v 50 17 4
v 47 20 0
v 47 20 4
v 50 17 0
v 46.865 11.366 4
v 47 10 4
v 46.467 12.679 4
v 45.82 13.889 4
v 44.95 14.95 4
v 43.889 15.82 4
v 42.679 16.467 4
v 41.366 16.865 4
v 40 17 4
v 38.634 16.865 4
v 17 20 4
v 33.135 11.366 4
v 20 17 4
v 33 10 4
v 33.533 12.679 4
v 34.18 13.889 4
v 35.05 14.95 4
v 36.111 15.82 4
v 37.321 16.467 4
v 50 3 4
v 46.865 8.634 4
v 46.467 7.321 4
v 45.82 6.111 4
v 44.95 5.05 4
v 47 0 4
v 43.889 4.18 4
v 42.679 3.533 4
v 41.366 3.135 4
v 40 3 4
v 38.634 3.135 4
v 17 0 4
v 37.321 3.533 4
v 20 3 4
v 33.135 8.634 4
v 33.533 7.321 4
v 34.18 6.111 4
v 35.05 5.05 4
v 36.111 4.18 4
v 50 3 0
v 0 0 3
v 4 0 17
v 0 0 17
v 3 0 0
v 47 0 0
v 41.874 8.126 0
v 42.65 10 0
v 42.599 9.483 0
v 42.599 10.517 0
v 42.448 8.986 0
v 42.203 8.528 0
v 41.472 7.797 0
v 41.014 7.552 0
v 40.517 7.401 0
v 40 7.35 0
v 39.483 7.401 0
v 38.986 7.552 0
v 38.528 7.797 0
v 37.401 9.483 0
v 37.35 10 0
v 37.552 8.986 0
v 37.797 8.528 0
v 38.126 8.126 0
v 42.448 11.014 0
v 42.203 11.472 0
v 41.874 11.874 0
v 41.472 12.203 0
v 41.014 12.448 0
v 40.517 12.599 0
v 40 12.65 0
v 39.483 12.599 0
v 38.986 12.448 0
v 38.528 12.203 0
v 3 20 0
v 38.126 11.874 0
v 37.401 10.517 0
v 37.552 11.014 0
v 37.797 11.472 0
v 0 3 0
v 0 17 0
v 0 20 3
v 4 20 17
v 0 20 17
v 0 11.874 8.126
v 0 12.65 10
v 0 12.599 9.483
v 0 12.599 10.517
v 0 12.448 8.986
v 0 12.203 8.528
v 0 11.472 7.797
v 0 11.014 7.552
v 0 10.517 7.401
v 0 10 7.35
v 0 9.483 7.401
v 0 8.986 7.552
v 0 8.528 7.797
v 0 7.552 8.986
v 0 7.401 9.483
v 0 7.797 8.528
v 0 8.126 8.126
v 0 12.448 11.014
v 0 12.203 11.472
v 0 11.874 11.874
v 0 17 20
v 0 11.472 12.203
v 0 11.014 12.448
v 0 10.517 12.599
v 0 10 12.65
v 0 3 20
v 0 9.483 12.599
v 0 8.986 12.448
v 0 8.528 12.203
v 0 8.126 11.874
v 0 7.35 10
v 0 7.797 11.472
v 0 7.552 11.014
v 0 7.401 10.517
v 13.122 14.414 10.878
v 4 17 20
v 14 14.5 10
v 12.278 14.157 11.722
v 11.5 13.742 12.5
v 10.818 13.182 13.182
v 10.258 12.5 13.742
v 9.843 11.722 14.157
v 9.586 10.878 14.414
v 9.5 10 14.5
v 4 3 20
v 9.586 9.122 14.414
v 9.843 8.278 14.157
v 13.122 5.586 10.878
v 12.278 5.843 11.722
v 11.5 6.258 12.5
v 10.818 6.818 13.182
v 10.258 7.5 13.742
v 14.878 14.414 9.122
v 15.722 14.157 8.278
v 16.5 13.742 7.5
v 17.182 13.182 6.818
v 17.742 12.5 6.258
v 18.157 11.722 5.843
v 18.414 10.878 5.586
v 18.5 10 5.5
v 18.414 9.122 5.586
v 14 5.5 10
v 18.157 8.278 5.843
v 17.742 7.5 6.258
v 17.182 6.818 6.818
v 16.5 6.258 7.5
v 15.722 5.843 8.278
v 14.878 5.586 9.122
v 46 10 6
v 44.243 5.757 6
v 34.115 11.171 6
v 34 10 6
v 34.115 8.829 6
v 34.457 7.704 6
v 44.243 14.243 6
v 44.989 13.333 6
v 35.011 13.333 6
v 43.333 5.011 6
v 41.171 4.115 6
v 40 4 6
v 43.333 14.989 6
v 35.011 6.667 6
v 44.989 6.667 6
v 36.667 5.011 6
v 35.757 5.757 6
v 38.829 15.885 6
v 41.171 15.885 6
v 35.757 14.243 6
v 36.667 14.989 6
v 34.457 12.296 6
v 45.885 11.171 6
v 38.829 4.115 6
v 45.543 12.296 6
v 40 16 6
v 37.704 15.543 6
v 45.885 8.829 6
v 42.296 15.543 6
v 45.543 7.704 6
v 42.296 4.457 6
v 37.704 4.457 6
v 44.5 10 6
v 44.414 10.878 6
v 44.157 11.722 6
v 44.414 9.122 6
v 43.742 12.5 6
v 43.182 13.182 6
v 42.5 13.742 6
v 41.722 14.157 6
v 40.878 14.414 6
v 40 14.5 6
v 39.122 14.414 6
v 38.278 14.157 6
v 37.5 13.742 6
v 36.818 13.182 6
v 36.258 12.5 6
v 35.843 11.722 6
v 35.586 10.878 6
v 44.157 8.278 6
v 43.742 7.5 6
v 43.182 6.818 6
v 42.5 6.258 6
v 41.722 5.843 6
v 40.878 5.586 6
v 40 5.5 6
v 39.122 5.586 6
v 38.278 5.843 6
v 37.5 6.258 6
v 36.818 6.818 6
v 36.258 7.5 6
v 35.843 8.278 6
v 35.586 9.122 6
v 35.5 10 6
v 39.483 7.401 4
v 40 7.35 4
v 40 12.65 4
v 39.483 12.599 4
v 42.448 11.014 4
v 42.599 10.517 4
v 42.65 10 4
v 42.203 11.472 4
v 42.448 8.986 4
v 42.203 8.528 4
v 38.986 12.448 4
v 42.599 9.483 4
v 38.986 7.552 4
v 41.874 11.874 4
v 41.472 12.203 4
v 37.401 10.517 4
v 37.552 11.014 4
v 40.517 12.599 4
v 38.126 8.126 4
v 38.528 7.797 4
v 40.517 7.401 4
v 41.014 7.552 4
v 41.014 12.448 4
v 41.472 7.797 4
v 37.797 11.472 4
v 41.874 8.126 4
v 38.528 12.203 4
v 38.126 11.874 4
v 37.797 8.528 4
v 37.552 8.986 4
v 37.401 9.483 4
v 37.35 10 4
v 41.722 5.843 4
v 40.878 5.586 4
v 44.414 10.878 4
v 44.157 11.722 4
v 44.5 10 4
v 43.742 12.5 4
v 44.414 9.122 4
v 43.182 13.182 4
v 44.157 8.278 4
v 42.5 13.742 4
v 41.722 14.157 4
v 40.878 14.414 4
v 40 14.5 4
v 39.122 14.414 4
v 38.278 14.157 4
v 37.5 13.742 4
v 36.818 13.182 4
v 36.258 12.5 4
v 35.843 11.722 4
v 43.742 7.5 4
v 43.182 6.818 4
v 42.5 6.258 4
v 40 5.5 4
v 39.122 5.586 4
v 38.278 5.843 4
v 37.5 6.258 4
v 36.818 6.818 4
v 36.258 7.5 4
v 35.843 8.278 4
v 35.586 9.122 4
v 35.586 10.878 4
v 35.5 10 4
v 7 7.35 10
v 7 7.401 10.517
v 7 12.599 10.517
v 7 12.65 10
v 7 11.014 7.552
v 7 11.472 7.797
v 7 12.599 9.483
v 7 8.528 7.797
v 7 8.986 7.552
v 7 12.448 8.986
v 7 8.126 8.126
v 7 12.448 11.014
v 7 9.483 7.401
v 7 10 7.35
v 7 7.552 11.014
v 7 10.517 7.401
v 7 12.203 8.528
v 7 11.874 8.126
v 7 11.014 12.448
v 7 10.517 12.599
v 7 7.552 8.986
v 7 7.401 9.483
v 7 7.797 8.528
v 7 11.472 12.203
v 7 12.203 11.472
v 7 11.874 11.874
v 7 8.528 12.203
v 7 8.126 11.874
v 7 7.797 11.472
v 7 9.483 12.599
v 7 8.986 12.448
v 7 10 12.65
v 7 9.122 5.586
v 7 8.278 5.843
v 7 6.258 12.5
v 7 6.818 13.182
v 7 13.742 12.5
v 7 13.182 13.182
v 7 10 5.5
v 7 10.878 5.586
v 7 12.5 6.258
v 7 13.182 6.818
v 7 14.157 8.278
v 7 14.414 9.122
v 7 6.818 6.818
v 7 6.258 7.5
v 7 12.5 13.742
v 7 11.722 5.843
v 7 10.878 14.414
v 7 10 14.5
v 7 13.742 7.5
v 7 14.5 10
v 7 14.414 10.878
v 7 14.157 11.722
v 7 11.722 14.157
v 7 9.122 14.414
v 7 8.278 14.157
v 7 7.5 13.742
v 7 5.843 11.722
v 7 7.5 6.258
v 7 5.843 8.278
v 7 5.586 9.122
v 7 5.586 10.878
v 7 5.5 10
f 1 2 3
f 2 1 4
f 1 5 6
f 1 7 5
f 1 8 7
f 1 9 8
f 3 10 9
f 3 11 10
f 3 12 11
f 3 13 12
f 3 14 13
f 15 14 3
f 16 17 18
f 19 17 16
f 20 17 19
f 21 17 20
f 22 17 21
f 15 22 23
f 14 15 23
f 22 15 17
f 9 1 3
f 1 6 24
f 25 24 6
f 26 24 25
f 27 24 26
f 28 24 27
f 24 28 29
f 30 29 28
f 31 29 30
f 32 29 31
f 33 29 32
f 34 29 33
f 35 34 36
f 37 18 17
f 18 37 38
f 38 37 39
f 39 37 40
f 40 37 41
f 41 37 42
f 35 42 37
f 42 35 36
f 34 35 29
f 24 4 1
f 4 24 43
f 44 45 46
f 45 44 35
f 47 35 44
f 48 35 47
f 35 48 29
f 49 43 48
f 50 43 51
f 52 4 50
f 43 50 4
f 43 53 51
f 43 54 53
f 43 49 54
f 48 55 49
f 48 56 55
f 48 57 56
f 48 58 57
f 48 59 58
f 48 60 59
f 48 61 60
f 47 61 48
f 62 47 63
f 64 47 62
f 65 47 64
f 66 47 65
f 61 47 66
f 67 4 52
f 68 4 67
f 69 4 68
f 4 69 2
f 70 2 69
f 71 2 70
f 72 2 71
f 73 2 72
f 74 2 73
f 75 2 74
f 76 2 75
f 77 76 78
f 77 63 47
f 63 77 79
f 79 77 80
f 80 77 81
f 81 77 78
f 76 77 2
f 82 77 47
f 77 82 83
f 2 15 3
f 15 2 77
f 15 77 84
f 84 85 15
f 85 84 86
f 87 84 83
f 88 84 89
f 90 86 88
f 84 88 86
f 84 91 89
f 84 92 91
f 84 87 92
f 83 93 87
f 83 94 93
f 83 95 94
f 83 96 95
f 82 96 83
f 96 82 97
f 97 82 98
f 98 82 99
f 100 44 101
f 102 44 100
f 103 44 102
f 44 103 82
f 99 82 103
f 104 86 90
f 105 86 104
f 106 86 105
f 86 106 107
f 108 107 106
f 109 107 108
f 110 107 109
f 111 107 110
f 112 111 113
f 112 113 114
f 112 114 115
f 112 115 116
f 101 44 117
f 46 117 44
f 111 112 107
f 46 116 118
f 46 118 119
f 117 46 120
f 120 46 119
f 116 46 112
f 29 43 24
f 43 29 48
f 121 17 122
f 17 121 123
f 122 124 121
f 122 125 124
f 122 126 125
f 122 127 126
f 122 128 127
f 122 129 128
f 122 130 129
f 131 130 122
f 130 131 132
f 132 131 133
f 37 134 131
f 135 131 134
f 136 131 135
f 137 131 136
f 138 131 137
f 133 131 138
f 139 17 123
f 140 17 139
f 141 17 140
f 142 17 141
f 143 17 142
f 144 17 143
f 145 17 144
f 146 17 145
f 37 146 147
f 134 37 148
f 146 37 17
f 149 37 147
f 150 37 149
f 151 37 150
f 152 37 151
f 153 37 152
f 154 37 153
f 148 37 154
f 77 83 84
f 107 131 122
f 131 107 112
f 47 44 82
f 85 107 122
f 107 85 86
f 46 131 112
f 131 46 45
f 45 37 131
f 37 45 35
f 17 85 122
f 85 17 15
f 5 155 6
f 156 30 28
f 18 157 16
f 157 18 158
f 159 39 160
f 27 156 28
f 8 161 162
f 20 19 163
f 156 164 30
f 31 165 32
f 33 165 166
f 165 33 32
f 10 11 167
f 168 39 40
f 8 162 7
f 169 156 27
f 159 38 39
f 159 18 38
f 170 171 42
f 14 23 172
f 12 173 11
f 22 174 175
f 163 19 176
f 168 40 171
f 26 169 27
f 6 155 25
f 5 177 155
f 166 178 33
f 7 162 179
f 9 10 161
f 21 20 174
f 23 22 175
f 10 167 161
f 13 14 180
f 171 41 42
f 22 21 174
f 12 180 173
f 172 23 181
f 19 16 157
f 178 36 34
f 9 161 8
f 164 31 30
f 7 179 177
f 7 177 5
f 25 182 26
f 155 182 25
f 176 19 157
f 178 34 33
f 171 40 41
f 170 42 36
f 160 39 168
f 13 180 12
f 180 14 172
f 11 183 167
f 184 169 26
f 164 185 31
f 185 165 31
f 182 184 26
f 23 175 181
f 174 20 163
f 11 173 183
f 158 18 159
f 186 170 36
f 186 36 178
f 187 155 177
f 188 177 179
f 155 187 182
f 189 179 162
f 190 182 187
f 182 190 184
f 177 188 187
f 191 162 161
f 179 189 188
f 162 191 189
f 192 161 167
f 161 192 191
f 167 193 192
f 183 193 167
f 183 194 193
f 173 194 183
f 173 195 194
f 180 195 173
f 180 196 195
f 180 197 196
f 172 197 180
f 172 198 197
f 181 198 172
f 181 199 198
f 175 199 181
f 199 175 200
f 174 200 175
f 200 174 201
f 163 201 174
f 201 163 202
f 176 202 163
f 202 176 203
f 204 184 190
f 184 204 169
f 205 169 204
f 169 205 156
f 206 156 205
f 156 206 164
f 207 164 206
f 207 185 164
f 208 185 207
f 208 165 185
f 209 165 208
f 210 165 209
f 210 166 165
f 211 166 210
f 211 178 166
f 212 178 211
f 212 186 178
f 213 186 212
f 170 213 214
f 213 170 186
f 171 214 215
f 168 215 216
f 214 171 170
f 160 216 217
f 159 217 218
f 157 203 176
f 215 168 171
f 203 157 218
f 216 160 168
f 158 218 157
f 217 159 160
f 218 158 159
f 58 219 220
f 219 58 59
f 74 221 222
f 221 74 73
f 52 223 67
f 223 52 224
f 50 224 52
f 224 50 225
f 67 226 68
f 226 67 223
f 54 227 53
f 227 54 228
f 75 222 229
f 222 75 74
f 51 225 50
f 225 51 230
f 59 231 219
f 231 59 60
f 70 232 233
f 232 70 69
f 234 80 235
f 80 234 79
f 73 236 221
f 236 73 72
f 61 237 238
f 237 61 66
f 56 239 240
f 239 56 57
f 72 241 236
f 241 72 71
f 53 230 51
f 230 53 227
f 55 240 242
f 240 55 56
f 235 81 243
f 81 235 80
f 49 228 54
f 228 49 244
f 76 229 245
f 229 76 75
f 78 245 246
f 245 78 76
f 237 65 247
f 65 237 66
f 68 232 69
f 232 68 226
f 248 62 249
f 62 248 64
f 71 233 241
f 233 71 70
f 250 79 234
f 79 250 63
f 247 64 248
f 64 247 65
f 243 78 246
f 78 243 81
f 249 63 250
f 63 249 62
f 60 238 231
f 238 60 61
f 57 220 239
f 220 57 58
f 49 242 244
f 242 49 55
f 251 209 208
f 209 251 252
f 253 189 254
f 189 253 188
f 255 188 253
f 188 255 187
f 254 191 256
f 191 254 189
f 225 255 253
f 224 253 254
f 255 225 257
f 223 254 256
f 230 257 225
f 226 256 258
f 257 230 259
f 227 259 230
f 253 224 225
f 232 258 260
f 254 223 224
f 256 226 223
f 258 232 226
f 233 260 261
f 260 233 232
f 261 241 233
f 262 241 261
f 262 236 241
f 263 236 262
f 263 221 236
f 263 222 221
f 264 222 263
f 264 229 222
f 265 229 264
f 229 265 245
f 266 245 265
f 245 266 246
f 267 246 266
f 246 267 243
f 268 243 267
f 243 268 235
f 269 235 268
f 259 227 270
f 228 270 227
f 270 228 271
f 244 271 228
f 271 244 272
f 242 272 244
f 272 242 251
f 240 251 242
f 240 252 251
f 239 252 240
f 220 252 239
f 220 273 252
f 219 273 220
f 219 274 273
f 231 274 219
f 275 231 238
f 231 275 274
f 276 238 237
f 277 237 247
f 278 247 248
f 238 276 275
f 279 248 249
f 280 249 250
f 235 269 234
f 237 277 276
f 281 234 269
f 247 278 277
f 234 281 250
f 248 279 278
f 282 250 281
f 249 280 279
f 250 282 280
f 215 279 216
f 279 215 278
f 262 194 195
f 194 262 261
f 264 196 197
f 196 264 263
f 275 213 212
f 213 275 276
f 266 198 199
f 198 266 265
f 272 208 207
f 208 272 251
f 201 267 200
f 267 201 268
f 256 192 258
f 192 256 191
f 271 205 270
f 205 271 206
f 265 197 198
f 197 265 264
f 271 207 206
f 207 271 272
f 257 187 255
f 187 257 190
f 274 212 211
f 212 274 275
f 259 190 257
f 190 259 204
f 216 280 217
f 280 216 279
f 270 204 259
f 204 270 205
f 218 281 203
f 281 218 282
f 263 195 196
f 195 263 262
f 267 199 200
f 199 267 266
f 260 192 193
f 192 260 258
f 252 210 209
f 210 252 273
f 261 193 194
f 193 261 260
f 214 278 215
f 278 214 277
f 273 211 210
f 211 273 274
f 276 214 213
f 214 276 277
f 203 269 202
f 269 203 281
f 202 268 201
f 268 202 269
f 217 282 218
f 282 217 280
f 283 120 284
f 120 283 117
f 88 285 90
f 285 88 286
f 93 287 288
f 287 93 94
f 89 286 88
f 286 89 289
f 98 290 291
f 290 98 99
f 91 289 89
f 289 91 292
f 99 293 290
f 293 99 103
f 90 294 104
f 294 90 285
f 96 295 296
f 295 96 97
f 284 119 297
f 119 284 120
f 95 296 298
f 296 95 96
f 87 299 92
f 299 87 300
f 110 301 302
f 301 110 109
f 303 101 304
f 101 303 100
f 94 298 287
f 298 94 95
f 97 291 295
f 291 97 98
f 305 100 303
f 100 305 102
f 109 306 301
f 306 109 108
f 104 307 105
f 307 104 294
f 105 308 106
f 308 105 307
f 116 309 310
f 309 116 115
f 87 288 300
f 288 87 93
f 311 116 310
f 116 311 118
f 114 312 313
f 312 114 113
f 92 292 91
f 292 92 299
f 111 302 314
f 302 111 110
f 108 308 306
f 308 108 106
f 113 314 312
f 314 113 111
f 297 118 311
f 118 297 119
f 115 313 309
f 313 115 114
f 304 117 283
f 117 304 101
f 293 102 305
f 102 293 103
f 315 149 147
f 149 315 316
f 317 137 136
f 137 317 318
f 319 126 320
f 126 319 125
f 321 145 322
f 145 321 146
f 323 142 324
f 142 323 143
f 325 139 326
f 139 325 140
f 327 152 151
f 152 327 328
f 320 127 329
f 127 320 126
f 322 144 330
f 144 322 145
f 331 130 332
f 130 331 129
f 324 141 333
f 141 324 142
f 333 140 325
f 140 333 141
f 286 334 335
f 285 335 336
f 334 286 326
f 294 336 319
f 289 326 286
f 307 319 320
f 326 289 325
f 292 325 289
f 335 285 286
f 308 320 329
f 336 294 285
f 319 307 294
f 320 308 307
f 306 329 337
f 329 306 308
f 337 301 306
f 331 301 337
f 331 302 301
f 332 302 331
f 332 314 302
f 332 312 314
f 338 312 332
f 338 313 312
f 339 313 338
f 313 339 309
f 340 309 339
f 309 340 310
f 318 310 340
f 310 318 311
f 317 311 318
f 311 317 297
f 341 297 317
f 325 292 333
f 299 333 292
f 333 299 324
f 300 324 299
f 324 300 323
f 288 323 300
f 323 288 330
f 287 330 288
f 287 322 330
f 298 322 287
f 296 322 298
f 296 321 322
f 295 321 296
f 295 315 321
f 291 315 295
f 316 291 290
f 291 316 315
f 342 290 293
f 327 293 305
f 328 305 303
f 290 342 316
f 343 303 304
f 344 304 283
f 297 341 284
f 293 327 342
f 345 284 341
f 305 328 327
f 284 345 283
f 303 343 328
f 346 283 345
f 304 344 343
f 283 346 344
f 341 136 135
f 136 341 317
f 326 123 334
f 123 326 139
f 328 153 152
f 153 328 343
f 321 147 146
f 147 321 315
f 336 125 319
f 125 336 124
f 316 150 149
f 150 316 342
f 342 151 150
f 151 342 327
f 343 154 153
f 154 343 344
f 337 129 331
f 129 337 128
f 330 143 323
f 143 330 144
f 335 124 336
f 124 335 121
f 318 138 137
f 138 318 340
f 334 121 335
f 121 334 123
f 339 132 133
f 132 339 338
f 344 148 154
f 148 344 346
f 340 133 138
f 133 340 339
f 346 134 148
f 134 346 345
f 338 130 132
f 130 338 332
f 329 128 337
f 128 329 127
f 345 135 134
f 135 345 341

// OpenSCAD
difference() {
    union() {
        
//        translate([]) block2(50, 60, 4);
//        hull() {
//            translate([0, 0, 20]) rotate([0, 90, 0]) block2(20, 60, 4);
//            translate([0, 0,  0]) rotate([0, 0, 0]) block2(20, 60, 4);
//        }
//        hull() {
//            translate([0, 20-2.05/2,  4-1]) cube([50, 2.05, 1]);
//            translate([0, 20-2.05/2,  19]) cube([4, 2.05, 1]);
//        }
//        hull() {
//            translate([0, 40-2.05/2,  4-1]) cube([50, 2.05, 1]);
//            translate([0, 40-2.05/2,  19]) cube([4, 2.05, 1]);
//        }
        
//        translate([]) block2(50, 40, 4);
//        hull() {
//            translate([0, 0, 20]) rotate([0, 90, 0]) block2(20, 40, 4);
//            translate([0, 0,  0]) rotate([0, 0, 0]) block2(20, 40, 4);
//        }
//        hull() {
//            translate([0, 20-2.05/2,  4-1]) cube([50, 2.05, 1]);
//            translate([0, 20-2.05/2,  19]) cube([4, 2.05, 1]);
//        }
        
        translate([]) block2(50, 20, 4);
        hull() {
            translate([0, 0, 20]) rotate([0, 90, 0]) block2(20, 20, 4);
            translate([0, 0,  0]) rotate([0, 0, 0]) block2(20, 20, 4);
        }
        
        translate([40, 0+10, 4])  cylinder($fn=32, d1=14, d2=12, h=2);
//        translate([40, 20+10, 4]) cylinder($fn=32, d1=14, d2=12, h=2);
//        translate([40, 40+10, 4]) cylinder($fn=32, d1=14, d2=12, h=2);
    }
    
    // screws
    
    translate([40, 0+10, -1])   rotate([]) cylinder($fn=32, d=5.3, h=20);
    translate([40, 20+10, -1])  rotate([]) cylinder($fn=32, d=5.3, h=20);
    translate([40, 40+10, -1])  rotate([]) cylinder($fn=32, d=5.3, h=20);
    translate([40, 0+10, 4])   rotate([]) cylinder($fn=32, d=9, h=20);
    translate([40, 20+10, 4])  rotate([]) cylinder($fn=32, d=9, h=20);
    translate([40, 40+10, 4])  rotate([]) cylinder($fn=32, d=9, h=20);
    translate([-1, 0+10, 10])   rotate([0, 90]) cylinder($fn=32, d=5.3, h=20);
    translate([-1, 20+10, 10])  rotate([0, 90]) cylinder($fn=32, d=5.3, h=20);
    translate([-1, 40+10, 10])  rotate([0, 90]) cylinder($fn=32, d=5.3, h=20);
    translate([7, 0+10, 10])   rotate([0, 90]) cylinder($fn=32, d=9, h=20);
    translate([7, 20+10, 10])  rotate([0, 90]) cylinder($fn=32, d=9, h=20);
    translate([7, 40+10, 10])  rotate([0, 90]) cylinder($fn=32, d=9, h=20);
}

module block2(width, depth, height, crad=3, red=0) {
    
    // pythagorean theorem
    redp = sqrt(red*red + red*red) - red;
    
    points = [  [0+red, crad+redp], [crad+redp, 0+red],
                [width-crad-redp, 0+red], [width-red, crad+redp],
                [width-red, depth-crad-redp], [width-crad-redp, depth-red],
                [crad+redp, depth-red], [0+red, depth-crad-redp]];
    
    linear_extrude(height=height) polygon(points);
}
